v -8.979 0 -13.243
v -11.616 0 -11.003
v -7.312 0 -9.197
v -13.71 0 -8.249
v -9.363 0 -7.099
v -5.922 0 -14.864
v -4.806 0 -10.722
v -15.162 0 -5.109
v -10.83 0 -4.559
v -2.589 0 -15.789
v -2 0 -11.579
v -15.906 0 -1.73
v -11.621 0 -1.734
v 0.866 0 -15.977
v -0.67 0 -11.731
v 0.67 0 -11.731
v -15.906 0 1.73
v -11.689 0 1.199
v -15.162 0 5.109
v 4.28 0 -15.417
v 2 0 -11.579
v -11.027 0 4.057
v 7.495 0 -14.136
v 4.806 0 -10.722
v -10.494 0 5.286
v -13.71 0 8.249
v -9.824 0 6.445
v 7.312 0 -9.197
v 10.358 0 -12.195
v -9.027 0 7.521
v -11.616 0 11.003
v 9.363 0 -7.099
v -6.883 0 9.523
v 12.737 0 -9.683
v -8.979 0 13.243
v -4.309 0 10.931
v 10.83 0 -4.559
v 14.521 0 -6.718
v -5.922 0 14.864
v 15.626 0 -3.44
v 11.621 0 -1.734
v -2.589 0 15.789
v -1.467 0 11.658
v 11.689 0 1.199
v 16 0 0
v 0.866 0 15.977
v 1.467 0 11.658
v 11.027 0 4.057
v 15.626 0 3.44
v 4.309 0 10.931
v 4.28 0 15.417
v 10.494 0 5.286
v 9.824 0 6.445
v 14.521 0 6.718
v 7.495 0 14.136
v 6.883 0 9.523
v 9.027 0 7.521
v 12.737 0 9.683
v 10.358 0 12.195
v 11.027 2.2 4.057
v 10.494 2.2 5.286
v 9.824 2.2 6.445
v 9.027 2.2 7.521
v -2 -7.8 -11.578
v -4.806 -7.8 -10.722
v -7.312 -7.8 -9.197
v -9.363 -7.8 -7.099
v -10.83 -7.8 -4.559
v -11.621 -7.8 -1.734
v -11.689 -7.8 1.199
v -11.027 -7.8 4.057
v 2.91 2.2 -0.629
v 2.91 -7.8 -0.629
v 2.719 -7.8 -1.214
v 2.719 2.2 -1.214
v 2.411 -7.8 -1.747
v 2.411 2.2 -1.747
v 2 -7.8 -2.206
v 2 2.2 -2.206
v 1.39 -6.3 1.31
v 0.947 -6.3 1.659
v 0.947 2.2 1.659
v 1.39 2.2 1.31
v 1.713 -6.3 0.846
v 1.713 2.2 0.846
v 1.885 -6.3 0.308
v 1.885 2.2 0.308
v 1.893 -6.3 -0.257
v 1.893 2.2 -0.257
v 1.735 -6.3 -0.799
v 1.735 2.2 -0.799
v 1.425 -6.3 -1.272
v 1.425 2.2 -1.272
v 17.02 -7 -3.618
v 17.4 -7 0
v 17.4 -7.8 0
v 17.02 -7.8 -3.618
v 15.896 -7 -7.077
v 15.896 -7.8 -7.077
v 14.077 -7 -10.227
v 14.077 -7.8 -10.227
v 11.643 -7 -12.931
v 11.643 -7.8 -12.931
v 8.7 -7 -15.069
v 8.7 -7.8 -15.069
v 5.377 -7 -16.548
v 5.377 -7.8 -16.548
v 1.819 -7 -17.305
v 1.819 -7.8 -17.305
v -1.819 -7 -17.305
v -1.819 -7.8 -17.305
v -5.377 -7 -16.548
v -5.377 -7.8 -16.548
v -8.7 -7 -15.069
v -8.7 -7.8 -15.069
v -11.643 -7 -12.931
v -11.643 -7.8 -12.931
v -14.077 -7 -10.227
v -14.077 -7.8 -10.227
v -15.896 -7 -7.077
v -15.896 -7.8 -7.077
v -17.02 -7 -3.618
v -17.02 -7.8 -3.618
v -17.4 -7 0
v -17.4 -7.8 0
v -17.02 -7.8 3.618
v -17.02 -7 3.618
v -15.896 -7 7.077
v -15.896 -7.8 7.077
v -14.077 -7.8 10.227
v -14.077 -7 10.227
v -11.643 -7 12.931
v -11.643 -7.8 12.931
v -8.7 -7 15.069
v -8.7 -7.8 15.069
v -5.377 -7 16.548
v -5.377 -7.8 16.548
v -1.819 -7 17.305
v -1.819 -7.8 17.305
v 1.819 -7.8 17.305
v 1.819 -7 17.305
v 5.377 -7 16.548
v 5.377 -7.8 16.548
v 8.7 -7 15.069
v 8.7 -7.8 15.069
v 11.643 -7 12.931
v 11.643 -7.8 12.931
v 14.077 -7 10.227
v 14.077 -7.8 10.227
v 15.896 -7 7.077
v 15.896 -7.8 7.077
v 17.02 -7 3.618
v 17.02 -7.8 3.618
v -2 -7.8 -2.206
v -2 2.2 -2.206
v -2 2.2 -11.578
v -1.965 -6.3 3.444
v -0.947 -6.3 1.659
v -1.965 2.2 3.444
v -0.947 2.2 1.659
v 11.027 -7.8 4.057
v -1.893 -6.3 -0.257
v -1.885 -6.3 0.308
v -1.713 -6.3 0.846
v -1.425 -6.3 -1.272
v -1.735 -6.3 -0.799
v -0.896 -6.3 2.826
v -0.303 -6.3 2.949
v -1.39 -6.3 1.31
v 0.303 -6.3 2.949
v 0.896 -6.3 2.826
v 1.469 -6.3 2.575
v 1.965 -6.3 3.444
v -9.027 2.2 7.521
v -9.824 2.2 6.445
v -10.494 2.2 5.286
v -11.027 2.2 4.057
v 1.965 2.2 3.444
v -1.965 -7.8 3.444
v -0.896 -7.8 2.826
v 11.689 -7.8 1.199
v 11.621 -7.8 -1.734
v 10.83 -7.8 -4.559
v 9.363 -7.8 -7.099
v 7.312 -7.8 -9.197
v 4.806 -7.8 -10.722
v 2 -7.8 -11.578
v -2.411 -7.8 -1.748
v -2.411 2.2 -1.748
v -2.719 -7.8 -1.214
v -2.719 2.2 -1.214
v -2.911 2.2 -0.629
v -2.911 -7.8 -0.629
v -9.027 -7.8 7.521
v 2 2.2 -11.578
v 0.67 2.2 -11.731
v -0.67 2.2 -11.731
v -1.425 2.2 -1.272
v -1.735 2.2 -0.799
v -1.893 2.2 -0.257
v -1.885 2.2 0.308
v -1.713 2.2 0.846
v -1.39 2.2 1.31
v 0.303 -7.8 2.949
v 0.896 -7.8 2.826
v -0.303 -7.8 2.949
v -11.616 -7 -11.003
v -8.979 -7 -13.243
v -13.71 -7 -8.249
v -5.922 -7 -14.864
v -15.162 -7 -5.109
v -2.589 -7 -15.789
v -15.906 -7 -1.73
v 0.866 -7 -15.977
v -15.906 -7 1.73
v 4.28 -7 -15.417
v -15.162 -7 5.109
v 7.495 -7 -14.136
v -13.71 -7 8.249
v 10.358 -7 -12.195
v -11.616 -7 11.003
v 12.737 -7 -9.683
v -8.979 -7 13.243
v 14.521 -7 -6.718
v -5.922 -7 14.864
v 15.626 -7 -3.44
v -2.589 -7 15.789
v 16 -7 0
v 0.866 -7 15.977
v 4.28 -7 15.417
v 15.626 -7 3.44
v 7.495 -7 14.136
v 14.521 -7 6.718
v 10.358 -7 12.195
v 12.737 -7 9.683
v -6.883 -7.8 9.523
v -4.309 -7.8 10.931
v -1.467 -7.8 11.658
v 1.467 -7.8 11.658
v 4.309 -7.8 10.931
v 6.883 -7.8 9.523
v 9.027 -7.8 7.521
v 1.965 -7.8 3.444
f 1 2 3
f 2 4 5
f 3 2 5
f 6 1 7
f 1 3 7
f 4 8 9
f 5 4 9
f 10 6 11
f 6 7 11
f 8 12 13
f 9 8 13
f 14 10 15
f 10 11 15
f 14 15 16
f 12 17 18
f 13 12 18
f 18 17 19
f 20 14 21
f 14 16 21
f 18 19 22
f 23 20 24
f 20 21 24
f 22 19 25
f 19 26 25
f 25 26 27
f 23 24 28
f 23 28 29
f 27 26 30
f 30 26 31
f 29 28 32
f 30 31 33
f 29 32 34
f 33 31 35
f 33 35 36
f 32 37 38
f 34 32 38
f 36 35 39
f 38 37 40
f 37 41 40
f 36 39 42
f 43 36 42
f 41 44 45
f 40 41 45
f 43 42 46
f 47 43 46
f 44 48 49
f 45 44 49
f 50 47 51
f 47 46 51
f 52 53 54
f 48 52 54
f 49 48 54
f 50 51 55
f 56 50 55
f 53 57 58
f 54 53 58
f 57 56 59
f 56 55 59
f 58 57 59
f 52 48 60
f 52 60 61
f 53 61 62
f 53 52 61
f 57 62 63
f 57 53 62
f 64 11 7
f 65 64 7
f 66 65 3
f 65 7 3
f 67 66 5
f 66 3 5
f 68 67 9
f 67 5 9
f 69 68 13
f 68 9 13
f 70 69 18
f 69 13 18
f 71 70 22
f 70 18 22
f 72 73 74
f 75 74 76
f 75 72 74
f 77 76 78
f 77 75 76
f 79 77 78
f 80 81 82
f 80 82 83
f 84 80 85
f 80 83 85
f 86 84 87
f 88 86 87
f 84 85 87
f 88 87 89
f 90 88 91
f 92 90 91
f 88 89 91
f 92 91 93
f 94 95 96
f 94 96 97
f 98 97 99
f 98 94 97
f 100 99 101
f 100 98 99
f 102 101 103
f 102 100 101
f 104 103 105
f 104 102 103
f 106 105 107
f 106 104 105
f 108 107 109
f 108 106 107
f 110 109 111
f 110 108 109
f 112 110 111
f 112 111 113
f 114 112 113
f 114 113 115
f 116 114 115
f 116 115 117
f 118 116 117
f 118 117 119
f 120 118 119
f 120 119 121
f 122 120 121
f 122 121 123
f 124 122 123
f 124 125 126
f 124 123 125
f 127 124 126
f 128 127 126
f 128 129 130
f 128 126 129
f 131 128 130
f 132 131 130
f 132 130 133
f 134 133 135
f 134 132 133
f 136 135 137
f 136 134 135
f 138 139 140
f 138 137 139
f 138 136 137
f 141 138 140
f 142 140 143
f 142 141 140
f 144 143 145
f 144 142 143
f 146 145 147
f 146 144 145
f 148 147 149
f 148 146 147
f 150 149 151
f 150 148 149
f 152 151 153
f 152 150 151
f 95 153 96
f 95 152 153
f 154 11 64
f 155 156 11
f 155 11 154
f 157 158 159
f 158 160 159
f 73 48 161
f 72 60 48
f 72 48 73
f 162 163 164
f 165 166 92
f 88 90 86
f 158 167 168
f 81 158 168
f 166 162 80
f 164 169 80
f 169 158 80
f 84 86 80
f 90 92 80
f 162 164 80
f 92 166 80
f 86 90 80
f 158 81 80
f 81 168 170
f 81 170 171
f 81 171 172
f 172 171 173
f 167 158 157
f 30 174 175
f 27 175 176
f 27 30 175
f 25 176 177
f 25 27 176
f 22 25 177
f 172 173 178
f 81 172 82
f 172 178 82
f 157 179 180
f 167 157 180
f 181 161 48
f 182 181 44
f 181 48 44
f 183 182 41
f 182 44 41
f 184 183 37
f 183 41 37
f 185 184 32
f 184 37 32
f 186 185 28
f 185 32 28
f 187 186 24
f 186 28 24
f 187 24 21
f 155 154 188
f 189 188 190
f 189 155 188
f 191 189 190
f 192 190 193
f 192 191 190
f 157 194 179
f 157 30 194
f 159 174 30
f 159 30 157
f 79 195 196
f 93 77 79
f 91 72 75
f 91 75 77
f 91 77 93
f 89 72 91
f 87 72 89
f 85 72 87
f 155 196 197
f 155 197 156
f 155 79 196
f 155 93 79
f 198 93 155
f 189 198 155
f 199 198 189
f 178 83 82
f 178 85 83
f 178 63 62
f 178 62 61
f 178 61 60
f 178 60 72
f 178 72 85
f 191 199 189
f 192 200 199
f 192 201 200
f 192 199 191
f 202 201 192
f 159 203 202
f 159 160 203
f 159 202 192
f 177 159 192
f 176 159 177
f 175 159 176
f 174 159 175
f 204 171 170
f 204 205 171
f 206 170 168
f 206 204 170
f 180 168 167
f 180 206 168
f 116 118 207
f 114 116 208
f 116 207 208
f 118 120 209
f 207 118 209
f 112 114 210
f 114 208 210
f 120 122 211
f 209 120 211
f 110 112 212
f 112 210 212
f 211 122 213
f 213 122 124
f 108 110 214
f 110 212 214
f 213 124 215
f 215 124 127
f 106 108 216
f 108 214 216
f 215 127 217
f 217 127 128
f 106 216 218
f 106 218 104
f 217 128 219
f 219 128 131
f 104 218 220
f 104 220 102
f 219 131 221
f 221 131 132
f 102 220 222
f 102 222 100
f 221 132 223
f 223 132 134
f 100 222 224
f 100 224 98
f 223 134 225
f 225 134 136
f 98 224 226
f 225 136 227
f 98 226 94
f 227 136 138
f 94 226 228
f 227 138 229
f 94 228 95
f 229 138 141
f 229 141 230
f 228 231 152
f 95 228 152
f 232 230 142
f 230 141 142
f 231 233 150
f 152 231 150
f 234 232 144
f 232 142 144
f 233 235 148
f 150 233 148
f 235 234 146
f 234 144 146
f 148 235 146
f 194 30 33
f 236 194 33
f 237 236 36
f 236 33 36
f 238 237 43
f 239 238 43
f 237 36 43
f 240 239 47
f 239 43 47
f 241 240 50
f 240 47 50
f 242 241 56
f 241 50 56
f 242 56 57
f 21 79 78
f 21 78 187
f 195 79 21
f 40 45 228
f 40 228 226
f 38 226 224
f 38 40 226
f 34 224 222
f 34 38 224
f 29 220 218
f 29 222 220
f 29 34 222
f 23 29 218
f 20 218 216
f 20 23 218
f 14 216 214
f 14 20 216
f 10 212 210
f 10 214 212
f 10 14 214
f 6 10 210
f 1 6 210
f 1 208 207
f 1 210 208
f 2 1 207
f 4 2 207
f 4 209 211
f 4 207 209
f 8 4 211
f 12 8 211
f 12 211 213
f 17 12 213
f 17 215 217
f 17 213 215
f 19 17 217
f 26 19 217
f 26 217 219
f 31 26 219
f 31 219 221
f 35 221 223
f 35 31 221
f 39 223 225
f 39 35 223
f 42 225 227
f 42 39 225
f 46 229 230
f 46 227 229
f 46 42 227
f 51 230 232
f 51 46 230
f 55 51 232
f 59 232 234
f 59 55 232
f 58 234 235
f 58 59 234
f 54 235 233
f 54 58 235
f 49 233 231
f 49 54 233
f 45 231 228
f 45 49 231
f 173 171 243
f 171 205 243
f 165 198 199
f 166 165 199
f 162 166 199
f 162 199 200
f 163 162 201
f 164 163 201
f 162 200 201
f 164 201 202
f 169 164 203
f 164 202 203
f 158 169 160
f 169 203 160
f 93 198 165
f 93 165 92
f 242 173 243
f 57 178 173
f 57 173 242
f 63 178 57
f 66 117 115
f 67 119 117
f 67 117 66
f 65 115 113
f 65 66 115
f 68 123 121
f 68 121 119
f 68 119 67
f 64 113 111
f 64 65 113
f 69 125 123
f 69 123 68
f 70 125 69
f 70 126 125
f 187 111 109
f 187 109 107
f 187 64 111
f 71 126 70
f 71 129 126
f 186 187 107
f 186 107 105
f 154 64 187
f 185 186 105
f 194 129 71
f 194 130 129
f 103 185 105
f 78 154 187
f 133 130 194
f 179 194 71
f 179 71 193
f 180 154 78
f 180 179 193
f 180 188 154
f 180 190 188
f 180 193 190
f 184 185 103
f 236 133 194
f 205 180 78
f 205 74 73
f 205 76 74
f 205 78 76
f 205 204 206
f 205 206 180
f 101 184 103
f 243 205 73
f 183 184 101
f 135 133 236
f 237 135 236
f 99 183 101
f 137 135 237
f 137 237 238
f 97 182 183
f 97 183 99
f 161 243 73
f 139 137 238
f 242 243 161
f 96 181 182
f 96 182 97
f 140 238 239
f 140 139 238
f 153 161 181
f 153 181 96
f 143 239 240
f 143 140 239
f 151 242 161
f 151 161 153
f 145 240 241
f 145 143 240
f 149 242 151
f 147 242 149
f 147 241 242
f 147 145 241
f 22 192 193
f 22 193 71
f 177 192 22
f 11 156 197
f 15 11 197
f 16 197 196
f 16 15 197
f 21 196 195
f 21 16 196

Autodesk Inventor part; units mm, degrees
ref_plane "YZ Plane" through (0, 0, 0) normal (1, 0, 0) x (0, 1, 0)
ref_plane "XZ Plane" through (0, 0, 0) normal (0, 1, 0) x (-1, 0, 0)
ref_plane "XY Plane" through (0, 0, 0) normal (0, 0, 1) x (1, 0, 0)
sketch "Sketch1" plane through (0, 0, 0) normal (0, 1, 0) x (-1, 0, 0)
  circle A0 centre (0, 0) radius 11.75
  dimension "d0" = 23.5
extrude "Extrusion1" add sketch "Sketch1" along normal blind 2.2
sketch "Sketch2" plane through (0, 0, 0) normal (0, -1, 0) x (1, 0, 0)
  circle A0 centre (0, 0) radius 16
  dimension "d3" = 32
extrude "Extrusion2" add sketch "Sketch2" along normal blind 7
sketch "Sketch3" plane through (0, 2.2, 0) normal (0, 1, 0) x (1, 0, 0)
  arc A0 (-1.425, 1.2718) -> (1.425, 1.2718) centre (0, 0) ccw
  line L0 (-1.425, 1.2718) -> (1.425, 1.2718)
  dimension "d6" = 3.82
  dimension "d7" = 2.85
extrude "Extrusion3" cut sketch "Sketch3" against normal blind 8.5
sketch "Sketch6" plane through (0, -7, 0) normal (0, -1, 0) x (1, 0, 0)
  circle A0 centre (0, 0) radius 17.4
  circle A1 centre (0, 0) radius 16 projected
  dimension "d16" = 1.4
extrude "Extrusion6" add sketch "Sketch6" along normal blind 0.8 contours A0 | A1
sketch "Sketch7" plane through (0, 2.2, 0) normal (0, 1, 0) x (1, 0, 0)
  circle A0 centre (0, 0) radius 11.75 projected
  line L0 (-1.425, 1.2718) -> (1.425, 1.2718) projected
  arc A1 (-1.425, 1.2718) -> (1.425, 1.2718) centre (0, 0) ccw projected
  circle A2 centre (0, 0) radius 11.75 projected
  line L1 (-2, 11.5785) -> (-2, 2.1889)
  line L2 (2, 2.1889) -> (2, 11.5785)
  line L3 (1.8733, 0.3725) -> (1.9126, 0.3725)
  line L4 (0, 0) -> (0, 15.765) construction
  line L5 (-2.8956, 0.6376) -> (-11.0273, -4.0572)
  line L6 (-9.0273, -7.5213) -> (-0.8956, -2.8265)
  line L7 (0.8956, -2.8265) -> (9.0273, -7.5213)
  line L8 (11.0273, -4.0572) -> (2.8956, 0.6376)
  line L9 (-1.525, 1.2942) -> (-1.525, 15.9272) projected
  arc A3 (11.0273, -4.0572) -> (2, 11.5785) centre (0, 0) ccw
  arc A4 (-2, 11.5785) -> (-11.0273, -4.0572) centre (0, 0) ccw
  arc A5 (-9.0273, -7.5213) -> (9.0273, -7.5213) centre (0, 0) ccw
  arc A6 (2.8956, 0.6376) -> (2, 2.1889) centre (0, 0) ccw
  arc A7 (-1.425, 1.2718) -> (1.425, 1.2718) centre (0, 0) ccw projected
  line L10 (1.965, -3.4439) -> (0, 0)
  line L11 (0, 0) -> (-1.965, -3.4439)
  arc A8 (1.4757, -2.5863) -> (-1.525, -2.5576) centre (0, 0) ccw
  arc A9 (-2, 2.1889) -> (-2.8956, 0.6376) centre (0, 0) ccw
  arc A10 (2.8956, 0.6376) -> (2, 2.1889) centre (0, 0) ccw
  arc A11 (1.4757, -2.5863) -> (-1.525, -2.5576) centre (0, 0) ccw
  dimension "d20" = 4
  dimension "d23" = 360
extrude "Extrusion7" cut sketch "Sketch7" against normal blind 10 contours A0 L8 A8 L2 | A0 L6 L11 A1 L10 L7 | L1 A8 L5 A0 | A1 L11 L10
sketch "Sketch8" plane through (0, -7.8, 0) normal (0, -1, 0) x (1, 0, 0)
  arc A0 (2, -2.1889) -> (2.8956, -0.6376) centre (0, 0) ccw projected
  line L0 (0, 0) -> (-1.965, 3.4439) projected
  line L1 (-1.965, 3.4439) -> (-9.0273, 7.5213) projected
  line L2 (-1.965, 3.4439) -> (-0.8956, 2.8265)
  line L3 (0.8956, 2.8265) -> (1.965, 3.4439)
  line L4 (0.9466, 1.659) -> (1.965, 3.4439) projected
  line L5 (1.965, 3.4439) -> (1.4558, 2.5514)
  line L6 (-1.965, 3.4439) -> (-1.4694, 2.5753)
  arc A1 (-1.4694, 2.5753) -> (1.4694, 2.5753) centre (0, 0) ccw
  arc A2 (0.8956, 2.8265) -> (-0.8956, 2.8265) centre (0, 0) ccw
extrude "Extrusion8" add sketch "Sketch8" against normal blind 1.5
properties part number "wheelPixi1"
